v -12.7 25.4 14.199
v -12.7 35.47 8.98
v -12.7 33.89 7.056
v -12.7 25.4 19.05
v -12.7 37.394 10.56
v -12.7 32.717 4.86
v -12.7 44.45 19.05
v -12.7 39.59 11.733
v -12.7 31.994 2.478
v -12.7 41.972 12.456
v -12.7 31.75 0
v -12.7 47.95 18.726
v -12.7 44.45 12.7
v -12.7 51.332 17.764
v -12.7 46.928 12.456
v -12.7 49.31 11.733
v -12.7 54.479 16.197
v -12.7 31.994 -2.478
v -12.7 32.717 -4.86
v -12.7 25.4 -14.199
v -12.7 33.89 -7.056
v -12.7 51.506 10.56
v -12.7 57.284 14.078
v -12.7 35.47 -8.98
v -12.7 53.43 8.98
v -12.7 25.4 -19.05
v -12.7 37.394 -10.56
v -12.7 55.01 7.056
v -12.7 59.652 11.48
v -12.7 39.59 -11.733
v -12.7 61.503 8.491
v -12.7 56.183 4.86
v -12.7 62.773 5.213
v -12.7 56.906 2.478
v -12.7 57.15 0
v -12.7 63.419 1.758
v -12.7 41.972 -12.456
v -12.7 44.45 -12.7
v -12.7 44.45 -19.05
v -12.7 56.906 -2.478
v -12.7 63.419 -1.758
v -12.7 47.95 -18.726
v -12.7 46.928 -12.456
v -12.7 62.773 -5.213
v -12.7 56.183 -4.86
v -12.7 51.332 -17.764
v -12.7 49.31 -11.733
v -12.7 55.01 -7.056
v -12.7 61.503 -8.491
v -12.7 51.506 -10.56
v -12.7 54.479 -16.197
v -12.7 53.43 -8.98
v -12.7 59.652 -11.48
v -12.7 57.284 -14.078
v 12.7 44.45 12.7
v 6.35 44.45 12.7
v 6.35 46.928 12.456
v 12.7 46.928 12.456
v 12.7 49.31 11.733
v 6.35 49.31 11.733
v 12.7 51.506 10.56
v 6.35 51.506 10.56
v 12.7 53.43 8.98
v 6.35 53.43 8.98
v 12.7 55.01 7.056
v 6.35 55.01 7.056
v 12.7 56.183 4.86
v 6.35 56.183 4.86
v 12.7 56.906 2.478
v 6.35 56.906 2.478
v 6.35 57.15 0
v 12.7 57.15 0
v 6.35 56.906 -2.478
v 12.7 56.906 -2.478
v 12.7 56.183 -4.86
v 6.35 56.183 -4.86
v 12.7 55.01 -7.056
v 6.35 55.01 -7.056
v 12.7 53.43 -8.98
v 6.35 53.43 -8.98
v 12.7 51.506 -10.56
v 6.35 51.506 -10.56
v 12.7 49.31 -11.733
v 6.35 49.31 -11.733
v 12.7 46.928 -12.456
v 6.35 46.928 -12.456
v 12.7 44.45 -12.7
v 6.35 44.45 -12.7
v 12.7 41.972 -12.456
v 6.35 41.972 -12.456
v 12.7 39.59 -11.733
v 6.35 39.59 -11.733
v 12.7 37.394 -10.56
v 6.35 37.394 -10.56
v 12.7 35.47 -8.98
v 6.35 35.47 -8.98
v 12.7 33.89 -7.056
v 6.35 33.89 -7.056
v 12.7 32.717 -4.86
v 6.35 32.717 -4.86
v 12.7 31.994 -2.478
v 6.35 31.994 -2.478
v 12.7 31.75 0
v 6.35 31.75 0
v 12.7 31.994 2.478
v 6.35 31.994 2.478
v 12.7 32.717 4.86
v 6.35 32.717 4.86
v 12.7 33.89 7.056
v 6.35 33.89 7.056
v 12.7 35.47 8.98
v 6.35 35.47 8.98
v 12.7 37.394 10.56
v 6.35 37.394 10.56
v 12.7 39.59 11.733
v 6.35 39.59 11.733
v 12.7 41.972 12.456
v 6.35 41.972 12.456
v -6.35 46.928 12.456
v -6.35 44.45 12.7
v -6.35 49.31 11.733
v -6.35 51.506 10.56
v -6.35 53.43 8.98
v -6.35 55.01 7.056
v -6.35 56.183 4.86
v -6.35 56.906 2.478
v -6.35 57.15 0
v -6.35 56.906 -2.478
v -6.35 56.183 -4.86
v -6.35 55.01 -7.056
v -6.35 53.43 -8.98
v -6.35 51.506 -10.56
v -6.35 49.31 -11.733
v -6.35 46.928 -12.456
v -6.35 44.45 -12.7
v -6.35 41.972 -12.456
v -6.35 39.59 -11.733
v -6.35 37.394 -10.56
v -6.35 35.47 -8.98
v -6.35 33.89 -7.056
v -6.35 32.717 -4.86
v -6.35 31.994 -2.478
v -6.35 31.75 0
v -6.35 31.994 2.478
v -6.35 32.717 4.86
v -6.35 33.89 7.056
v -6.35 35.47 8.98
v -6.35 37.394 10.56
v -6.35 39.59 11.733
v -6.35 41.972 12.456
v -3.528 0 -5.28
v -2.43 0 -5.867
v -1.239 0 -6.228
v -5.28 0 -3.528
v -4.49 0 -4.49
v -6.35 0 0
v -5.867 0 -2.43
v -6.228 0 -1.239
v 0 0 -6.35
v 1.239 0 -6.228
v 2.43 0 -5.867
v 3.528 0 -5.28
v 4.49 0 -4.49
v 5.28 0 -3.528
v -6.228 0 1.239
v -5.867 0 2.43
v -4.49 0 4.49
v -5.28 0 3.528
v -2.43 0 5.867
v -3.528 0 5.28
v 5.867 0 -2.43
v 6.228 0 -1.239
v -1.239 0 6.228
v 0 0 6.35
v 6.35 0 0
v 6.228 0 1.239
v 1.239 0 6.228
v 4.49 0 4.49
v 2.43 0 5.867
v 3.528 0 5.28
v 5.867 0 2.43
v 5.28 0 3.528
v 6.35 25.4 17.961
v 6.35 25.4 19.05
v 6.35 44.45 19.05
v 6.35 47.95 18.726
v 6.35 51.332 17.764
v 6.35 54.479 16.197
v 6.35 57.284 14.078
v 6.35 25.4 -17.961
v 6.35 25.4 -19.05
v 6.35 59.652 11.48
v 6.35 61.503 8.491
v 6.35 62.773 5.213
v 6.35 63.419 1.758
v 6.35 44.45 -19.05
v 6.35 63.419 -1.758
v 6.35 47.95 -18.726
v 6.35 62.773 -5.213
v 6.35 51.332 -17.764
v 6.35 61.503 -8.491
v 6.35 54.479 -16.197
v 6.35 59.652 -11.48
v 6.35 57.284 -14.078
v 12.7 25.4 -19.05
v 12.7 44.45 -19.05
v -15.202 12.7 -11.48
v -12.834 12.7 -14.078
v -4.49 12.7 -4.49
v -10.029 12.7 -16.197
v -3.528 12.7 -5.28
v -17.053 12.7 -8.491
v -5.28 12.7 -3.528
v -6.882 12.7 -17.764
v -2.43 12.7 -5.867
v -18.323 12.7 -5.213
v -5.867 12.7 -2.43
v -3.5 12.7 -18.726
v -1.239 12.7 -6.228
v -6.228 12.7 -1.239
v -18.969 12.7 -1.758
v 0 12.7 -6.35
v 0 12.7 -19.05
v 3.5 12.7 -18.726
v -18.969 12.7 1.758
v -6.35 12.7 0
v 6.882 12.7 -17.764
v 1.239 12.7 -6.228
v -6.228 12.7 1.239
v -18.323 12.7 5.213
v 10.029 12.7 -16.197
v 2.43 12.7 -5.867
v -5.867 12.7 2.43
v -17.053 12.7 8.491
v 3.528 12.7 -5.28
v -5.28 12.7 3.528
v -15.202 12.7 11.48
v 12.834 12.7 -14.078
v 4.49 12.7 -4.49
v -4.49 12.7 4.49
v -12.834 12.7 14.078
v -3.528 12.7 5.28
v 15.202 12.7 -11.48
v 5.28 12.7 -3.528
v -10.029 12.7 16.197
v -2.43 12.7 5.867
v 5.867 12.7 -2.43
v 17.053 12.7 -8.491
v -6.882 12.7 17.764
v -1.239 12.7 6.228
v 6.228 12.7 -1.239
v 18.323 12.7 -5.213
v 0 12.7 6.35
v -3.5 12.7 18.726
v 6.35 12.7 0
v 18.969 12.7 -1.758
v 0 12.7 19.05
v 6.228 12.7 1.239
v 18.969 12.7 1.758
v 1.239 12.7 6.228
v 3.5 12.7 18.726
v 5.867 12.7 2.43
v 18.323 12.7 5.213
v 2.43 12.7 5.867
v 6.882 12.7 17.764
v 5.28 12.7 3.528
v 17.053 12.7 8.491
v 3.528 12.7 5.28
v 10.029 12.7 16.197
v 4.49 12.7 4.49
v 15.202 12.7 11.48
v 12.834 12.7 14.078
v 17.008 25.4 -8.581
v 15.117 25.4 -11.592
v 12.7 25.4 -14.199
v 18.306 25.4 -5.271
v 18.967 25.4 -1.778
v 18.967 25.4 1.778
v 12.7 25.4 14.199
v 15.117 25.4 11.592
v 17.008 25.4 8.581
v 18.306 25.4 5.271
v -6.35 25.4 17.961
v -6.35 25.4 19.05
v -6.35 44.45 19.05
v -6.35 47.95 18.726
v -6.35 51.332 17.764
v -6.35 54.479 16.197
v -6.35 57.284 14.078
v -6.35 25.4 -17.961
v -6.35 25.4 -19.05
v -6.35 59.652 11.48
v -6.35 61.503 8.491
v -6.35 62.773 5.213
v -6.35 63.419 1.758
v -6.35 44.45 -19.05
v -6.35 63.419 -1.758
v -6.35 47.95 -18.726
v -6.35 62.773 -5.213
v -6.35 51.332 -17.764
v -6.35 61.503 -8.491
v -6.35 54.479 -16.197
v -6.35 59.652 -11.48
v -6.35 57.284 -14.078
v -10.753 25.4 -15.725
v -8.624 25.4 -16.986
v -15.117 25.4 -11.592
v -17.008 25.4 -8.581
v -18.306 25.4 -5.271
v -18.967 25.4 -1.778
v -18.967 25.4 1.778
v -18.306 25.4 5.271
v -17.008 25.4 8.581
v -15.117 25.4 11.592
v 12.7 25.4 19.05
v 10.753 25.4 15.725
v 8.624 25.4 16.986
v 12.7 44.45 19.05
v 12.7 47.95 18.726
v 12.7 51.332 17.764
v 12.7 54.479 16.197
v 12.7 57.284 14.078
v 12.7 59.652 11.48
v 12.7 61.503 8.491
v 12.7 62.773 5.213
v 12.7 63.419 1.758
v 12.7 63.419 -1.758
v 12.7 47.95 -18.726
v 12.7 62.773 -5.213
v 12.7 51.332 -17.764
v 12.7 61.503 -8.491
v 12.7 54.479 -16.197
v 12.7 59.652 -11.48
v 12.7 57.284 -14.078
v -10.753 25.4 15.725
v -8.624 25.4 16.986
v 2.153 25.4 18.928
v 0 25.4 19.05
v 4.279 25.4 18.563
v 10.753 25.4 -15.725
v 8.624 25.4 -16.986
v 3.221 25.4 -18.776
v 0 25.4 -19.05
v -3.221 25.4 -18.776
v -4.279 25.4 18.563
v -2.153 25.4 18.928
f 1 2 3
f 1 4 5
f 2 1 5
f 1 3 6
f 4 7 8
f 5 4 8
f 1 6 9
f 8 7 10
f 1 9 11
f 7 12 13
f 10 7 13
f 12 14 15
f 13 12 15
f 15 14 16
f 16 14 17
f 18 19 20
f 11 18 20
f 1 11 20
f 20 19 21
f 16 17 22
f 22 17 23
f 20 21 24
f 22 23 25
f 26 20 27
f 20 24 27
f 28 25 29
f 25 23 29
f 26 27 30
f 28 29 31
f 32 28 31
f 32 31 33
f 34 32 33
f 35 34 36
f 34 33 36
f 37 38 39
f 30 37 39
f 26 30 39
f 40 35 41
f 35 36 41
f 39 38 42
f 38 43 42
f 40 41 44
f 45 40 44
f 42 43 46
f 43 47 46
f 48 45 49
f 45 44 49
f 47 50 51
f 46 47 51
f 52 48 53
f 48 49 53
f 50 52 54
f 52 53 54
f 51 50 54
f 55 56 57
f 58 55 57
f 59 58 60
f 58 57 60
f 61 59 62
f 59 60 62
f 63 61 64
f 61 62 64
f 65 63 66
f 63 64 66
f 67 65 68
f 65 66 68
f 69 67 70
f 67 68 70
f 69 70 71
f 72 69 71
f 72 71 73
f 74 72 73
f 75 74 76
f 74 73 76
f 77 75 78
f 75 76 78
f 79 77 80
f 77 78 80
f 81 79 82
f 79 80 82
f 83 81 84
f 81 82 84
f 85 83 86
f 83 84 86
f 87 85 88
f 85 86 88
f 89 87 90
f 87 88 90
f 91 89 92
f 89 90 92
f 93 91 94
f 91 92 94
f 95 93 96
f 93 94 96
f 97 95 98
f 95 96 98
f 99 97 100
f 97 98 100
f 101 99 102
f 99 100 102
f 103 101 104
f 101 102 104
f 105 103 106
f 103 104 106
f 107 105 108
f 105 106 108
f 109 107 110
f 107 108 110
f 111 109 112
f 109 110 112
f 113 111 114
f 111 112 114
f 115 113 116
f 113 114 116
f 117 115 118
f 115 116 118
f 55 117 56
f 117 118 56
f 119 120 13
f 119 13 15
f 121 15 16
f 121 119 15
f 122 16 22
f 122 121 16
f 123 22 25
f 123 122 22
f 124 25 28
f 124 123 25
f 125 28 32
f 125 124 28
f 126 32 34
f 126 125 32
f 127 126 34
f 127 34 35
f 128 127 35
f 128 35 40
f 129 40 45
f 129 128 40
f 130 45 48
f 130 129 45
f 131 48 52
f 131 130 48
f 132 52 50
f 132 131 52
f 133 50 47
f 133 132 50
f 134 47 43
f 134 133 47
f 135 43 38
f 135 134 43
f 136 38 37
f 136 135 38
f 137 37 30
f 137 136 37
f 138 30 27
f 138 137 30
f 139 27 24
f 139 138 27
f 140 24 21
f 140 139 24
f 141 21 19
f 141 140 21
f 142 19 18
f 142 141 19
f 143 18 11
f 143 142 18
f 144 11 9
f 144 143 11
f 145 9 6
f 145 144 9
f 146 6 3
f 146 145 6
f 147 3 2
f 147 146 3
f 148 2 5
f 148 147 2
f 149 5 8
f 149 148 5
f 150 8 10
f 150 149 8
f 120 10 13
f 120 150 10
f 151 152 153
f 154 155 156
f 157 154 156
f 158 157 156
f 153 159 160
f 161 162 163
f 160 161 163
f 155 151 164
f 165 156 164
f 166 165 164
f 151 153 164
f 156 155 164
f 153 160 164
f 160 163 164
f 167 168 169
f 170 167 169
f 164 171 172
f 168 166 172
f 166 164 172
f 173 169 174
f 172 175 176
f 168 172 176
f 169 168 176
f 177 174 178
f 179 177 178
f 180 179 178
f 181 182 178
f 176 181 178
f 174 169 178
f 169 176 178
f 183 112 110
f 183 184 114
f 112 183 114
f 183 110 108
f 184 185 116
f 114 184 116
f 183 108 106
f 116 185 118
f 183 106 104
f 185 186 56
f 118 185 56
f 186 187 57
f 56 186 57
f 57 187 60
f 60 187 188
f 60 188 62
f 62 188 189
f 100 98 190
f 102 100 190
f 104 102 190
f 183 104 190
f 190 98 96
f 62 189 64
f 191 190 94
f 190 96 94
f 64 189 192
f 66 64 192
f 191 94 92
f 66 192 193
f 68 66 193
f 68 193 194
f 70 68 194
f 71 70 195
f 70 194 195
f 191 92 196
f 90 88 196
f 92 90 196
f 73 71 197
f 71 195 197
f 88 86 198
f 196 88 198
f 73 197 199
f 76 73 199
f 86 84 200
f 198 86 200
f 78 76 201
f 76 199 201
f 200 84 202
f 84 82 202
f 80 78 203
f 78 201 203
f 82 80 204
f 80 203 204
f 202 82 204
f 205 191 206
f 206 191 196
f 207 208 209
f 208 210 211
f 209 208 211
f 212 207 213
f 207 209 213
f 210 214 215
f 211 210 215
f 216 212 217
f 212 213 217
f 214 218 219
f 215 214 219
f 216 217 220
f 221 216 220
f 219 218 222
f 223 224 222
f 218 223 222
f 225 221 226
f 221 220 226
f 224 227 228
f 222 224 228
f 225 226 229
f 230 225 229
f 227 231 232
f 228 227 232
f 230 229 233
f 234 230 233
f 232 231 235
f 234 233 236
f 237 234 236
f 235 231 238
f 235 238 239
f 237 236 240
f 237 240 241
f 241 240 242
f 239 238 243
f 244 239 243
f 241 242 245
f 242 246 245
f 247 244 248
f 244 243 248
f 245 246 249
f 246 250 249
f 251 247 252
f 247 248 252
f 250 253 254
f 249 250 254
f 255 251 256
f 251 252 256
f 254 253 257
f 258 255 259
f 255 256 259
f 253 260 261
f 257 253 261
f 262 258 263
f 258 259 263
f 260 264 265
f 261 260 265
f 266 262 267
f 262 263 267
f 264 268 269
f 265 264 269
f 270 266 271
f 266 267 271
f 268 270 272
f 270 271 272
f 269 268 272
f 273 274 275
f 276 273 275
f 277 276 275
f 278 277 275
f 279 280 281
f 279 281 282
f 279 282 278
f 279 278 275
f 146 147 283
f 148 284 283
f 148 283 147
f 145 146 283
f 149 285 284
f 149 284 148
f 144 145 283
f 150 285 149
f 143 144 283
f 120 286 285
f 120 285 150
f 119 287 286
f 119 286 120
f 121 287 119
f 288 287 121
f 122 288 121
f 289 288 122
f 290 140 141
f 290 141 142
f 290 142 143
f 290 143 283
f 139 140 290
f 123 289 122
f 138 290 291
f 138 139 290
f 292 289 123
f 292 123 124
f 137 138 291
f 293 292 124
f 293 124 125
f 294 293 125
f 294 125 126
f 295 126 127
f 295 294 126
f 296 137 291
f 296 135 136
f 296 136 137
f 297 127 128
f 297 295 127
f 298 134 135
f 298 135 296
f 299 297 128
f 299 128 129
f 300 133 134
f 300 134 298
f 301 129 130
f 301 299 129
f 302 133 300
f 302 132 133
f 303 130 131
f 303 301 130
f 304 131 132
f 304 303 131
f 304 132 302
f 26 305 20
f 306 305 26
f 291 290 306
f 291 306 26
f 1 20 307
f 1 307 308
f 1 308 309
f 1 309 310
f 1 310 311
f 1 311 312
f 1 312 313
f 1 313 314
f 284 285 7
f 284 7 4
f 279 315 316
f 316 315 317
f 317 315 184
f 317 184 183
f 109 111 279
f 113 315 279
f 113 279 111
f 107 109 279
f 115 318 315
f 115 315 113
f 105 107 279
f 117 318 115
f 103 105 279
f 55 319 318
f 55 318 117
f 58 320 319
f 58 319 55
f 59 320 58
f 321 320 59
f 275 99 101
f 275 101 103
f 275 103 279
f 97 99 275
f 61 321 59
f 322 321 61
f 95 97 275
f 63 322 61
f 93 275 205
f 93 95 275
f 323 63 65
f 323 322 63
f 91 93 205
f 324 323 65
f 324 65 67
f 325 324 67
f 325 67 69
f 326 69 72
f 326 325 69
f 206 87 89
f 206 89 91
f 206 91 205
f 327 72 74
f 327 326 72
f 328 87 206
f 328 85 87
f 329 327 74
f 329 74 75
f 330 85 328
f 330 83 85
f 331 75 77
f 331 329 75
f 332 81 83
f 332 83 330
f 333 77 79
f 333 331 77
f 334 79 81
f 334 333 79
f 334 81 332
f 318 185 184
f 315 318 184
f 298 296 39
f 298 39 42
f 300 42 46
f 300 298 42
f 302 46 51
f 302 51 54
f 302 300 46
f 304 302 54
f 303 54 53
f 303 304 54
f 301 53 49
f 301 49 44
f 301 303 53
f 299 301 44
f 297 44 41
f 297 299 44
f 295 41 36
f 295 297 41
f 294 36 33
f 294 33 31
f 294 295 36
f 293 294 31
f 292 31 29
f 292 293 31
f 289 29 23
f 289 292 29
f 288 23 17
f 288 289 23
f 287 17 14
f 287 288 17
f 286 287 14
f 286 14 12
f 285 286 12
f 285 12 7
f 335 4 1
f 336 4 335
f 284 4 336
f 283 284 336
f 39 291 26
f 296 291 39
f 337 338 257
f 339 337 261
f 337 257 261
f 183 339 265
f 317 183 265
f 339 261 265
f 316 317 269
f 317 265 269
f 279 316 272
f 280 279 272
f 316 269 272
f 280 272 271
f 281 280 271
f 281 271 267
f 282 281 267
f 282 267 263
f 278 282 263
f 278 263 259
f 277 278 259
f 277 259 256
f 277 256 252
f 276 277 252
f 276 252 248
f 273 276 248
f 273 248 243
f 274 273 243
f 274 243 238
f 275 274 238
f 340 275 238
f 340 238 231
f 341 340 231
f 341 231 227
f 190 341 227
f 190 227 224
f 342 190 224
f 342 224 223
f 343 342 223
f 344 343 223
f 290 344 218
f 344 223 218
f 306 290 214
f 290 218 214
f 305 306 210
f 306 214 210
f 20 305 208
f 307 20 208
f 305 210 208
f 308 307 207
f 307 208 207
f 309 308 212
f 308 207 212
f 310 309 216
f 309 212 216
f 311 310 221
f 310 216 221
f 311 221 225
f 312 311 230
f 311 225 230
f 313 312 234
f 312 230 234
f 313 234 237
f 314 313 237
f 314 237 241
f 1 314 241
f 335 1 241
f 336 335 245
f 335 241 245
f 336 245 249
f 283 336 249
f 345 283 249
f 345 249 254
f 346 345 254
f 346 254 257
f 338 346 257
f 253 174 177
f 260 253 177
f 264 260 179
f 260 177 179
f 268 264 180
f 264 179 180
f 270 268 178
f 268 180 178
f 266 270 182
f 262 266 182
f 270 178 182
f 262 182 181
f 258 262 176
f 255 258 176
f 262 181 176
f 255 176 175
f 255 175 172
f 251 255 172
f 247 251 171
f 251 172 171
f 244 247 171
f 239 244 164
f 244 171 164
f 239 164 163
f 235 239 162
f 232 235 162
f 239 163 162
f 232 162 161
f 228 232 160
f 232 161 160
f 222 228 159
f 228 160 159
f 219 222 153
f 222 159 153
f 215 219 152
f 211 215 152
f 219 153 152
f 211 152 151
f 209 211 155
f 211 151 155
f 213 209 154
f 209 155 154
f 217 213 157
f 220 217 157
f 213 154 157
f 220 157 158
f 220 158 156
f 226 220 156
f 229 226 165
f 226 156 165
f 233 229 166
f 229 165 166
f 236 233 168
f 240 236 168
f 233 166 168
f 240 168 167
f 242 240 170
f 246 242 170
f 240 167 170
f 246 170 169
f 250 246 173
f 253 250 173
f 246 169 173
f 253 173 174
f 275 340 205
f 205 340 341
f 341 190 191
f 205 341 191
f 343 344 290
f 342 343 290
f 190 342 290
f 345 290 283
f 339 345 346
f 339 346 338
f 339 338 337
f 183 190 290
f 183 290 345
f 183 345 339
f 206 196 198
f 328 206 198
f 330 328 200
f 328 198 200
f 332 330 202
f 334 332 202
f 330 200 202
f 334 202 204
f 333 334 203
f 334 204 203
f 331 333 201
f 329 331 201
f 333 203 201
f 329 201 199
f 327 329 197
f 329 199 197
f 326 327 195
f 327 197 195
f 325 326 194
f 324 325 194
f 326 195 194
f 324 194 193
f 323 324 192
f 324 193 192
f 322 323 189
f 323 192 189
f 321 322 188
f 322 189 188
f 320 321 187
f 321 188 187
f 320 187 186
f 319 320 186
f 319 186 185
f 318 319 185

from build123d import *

# Parameters (mm, degrees)
SKETCH1_R              = 6.35
TOFITINTOBEARING_DEPTH = 12.7
SKETCH2_R              = 19.05
TOSITATOPBEARING_DEPTH = 12.7
BOSS_EXTRUDE3_START    = 6.35
BOSS_EXTRUDE3_DEPTH    = 6.35
SKETCH8_R              = 12.7
CUT_EXTRUDE3_DEPTH     = 6.35


with BuildPart() as part:
    # Sketch1 → ToFitIntoBearing (new body)
    with BuildSketch(Plane(origin=(0, 0, 0), x_dir=(1, 0, 0), z_dir=(0, 1, 0))):
        Circle(SKETCH1_R)
    extrude(amount=TOFITINTOBEARING_DEPTH)

    # Sketch2 → ToSitAtopBearing (add)
    with BuildSketch(Plane(origin=(0, 12.7, 0), x_dir=(1, 0, 0), z_dir=(0, 1, 0))):
        Circle(SKETCH2_R)
    extrude(amount=TOSITATOPBEARING_DEPTH)

    # Sketch7 → Boss-Extrude3 (add)
    with BuildSketch(Plane(origin=(0, 0, 0), x_dir=(0, 0, -1), z_dir=(1, 0, 0)).offset(BOSS_EXTRUDE3_START)):
        with BuildLine():
            Line((-19.05, 44.45), (-19.05, 25.4))
            Line((-19.05, 25.4), (19.05, 25.4))
            Line((19.05, 25.4), (19.05, 44.45))
            ThreePointArc((19.05, 44.45), (0, 63.5), (-19.05, 44.45))
        make_face()
    boss_extrude3 = extrude(amount=BOSS_EXTRUDE3_DEPTH)

    # Sketch8 → Cut-Extrude3 (cut)
    with BuildSketch(Plane.ZY.offset(-6.35)):
        with Locations((0, 44.45)):
            Circle(SKETCH8_R)
    cut_extrude3 = extrude(amount=-CUT_EXTRUDE3_DEPTH, mode=Mode.SUBTRACT)

    # Mirror2: Boss-Extrude3, Cut-Extrude3 across plane
    add(boss_extrude3.mirror(Plane(origin=(0, 0, 0), x_dir=(0, 0, 1), z_dir=(1, 0, 0))))
    add(cut_extrude3.mirror(Plane(origin=(0, 0, 0), x_dir=(0, 0, 1), z_dir=(1, 0, 0))), mode=Mode.SUBTRACT)


solid = part.part
